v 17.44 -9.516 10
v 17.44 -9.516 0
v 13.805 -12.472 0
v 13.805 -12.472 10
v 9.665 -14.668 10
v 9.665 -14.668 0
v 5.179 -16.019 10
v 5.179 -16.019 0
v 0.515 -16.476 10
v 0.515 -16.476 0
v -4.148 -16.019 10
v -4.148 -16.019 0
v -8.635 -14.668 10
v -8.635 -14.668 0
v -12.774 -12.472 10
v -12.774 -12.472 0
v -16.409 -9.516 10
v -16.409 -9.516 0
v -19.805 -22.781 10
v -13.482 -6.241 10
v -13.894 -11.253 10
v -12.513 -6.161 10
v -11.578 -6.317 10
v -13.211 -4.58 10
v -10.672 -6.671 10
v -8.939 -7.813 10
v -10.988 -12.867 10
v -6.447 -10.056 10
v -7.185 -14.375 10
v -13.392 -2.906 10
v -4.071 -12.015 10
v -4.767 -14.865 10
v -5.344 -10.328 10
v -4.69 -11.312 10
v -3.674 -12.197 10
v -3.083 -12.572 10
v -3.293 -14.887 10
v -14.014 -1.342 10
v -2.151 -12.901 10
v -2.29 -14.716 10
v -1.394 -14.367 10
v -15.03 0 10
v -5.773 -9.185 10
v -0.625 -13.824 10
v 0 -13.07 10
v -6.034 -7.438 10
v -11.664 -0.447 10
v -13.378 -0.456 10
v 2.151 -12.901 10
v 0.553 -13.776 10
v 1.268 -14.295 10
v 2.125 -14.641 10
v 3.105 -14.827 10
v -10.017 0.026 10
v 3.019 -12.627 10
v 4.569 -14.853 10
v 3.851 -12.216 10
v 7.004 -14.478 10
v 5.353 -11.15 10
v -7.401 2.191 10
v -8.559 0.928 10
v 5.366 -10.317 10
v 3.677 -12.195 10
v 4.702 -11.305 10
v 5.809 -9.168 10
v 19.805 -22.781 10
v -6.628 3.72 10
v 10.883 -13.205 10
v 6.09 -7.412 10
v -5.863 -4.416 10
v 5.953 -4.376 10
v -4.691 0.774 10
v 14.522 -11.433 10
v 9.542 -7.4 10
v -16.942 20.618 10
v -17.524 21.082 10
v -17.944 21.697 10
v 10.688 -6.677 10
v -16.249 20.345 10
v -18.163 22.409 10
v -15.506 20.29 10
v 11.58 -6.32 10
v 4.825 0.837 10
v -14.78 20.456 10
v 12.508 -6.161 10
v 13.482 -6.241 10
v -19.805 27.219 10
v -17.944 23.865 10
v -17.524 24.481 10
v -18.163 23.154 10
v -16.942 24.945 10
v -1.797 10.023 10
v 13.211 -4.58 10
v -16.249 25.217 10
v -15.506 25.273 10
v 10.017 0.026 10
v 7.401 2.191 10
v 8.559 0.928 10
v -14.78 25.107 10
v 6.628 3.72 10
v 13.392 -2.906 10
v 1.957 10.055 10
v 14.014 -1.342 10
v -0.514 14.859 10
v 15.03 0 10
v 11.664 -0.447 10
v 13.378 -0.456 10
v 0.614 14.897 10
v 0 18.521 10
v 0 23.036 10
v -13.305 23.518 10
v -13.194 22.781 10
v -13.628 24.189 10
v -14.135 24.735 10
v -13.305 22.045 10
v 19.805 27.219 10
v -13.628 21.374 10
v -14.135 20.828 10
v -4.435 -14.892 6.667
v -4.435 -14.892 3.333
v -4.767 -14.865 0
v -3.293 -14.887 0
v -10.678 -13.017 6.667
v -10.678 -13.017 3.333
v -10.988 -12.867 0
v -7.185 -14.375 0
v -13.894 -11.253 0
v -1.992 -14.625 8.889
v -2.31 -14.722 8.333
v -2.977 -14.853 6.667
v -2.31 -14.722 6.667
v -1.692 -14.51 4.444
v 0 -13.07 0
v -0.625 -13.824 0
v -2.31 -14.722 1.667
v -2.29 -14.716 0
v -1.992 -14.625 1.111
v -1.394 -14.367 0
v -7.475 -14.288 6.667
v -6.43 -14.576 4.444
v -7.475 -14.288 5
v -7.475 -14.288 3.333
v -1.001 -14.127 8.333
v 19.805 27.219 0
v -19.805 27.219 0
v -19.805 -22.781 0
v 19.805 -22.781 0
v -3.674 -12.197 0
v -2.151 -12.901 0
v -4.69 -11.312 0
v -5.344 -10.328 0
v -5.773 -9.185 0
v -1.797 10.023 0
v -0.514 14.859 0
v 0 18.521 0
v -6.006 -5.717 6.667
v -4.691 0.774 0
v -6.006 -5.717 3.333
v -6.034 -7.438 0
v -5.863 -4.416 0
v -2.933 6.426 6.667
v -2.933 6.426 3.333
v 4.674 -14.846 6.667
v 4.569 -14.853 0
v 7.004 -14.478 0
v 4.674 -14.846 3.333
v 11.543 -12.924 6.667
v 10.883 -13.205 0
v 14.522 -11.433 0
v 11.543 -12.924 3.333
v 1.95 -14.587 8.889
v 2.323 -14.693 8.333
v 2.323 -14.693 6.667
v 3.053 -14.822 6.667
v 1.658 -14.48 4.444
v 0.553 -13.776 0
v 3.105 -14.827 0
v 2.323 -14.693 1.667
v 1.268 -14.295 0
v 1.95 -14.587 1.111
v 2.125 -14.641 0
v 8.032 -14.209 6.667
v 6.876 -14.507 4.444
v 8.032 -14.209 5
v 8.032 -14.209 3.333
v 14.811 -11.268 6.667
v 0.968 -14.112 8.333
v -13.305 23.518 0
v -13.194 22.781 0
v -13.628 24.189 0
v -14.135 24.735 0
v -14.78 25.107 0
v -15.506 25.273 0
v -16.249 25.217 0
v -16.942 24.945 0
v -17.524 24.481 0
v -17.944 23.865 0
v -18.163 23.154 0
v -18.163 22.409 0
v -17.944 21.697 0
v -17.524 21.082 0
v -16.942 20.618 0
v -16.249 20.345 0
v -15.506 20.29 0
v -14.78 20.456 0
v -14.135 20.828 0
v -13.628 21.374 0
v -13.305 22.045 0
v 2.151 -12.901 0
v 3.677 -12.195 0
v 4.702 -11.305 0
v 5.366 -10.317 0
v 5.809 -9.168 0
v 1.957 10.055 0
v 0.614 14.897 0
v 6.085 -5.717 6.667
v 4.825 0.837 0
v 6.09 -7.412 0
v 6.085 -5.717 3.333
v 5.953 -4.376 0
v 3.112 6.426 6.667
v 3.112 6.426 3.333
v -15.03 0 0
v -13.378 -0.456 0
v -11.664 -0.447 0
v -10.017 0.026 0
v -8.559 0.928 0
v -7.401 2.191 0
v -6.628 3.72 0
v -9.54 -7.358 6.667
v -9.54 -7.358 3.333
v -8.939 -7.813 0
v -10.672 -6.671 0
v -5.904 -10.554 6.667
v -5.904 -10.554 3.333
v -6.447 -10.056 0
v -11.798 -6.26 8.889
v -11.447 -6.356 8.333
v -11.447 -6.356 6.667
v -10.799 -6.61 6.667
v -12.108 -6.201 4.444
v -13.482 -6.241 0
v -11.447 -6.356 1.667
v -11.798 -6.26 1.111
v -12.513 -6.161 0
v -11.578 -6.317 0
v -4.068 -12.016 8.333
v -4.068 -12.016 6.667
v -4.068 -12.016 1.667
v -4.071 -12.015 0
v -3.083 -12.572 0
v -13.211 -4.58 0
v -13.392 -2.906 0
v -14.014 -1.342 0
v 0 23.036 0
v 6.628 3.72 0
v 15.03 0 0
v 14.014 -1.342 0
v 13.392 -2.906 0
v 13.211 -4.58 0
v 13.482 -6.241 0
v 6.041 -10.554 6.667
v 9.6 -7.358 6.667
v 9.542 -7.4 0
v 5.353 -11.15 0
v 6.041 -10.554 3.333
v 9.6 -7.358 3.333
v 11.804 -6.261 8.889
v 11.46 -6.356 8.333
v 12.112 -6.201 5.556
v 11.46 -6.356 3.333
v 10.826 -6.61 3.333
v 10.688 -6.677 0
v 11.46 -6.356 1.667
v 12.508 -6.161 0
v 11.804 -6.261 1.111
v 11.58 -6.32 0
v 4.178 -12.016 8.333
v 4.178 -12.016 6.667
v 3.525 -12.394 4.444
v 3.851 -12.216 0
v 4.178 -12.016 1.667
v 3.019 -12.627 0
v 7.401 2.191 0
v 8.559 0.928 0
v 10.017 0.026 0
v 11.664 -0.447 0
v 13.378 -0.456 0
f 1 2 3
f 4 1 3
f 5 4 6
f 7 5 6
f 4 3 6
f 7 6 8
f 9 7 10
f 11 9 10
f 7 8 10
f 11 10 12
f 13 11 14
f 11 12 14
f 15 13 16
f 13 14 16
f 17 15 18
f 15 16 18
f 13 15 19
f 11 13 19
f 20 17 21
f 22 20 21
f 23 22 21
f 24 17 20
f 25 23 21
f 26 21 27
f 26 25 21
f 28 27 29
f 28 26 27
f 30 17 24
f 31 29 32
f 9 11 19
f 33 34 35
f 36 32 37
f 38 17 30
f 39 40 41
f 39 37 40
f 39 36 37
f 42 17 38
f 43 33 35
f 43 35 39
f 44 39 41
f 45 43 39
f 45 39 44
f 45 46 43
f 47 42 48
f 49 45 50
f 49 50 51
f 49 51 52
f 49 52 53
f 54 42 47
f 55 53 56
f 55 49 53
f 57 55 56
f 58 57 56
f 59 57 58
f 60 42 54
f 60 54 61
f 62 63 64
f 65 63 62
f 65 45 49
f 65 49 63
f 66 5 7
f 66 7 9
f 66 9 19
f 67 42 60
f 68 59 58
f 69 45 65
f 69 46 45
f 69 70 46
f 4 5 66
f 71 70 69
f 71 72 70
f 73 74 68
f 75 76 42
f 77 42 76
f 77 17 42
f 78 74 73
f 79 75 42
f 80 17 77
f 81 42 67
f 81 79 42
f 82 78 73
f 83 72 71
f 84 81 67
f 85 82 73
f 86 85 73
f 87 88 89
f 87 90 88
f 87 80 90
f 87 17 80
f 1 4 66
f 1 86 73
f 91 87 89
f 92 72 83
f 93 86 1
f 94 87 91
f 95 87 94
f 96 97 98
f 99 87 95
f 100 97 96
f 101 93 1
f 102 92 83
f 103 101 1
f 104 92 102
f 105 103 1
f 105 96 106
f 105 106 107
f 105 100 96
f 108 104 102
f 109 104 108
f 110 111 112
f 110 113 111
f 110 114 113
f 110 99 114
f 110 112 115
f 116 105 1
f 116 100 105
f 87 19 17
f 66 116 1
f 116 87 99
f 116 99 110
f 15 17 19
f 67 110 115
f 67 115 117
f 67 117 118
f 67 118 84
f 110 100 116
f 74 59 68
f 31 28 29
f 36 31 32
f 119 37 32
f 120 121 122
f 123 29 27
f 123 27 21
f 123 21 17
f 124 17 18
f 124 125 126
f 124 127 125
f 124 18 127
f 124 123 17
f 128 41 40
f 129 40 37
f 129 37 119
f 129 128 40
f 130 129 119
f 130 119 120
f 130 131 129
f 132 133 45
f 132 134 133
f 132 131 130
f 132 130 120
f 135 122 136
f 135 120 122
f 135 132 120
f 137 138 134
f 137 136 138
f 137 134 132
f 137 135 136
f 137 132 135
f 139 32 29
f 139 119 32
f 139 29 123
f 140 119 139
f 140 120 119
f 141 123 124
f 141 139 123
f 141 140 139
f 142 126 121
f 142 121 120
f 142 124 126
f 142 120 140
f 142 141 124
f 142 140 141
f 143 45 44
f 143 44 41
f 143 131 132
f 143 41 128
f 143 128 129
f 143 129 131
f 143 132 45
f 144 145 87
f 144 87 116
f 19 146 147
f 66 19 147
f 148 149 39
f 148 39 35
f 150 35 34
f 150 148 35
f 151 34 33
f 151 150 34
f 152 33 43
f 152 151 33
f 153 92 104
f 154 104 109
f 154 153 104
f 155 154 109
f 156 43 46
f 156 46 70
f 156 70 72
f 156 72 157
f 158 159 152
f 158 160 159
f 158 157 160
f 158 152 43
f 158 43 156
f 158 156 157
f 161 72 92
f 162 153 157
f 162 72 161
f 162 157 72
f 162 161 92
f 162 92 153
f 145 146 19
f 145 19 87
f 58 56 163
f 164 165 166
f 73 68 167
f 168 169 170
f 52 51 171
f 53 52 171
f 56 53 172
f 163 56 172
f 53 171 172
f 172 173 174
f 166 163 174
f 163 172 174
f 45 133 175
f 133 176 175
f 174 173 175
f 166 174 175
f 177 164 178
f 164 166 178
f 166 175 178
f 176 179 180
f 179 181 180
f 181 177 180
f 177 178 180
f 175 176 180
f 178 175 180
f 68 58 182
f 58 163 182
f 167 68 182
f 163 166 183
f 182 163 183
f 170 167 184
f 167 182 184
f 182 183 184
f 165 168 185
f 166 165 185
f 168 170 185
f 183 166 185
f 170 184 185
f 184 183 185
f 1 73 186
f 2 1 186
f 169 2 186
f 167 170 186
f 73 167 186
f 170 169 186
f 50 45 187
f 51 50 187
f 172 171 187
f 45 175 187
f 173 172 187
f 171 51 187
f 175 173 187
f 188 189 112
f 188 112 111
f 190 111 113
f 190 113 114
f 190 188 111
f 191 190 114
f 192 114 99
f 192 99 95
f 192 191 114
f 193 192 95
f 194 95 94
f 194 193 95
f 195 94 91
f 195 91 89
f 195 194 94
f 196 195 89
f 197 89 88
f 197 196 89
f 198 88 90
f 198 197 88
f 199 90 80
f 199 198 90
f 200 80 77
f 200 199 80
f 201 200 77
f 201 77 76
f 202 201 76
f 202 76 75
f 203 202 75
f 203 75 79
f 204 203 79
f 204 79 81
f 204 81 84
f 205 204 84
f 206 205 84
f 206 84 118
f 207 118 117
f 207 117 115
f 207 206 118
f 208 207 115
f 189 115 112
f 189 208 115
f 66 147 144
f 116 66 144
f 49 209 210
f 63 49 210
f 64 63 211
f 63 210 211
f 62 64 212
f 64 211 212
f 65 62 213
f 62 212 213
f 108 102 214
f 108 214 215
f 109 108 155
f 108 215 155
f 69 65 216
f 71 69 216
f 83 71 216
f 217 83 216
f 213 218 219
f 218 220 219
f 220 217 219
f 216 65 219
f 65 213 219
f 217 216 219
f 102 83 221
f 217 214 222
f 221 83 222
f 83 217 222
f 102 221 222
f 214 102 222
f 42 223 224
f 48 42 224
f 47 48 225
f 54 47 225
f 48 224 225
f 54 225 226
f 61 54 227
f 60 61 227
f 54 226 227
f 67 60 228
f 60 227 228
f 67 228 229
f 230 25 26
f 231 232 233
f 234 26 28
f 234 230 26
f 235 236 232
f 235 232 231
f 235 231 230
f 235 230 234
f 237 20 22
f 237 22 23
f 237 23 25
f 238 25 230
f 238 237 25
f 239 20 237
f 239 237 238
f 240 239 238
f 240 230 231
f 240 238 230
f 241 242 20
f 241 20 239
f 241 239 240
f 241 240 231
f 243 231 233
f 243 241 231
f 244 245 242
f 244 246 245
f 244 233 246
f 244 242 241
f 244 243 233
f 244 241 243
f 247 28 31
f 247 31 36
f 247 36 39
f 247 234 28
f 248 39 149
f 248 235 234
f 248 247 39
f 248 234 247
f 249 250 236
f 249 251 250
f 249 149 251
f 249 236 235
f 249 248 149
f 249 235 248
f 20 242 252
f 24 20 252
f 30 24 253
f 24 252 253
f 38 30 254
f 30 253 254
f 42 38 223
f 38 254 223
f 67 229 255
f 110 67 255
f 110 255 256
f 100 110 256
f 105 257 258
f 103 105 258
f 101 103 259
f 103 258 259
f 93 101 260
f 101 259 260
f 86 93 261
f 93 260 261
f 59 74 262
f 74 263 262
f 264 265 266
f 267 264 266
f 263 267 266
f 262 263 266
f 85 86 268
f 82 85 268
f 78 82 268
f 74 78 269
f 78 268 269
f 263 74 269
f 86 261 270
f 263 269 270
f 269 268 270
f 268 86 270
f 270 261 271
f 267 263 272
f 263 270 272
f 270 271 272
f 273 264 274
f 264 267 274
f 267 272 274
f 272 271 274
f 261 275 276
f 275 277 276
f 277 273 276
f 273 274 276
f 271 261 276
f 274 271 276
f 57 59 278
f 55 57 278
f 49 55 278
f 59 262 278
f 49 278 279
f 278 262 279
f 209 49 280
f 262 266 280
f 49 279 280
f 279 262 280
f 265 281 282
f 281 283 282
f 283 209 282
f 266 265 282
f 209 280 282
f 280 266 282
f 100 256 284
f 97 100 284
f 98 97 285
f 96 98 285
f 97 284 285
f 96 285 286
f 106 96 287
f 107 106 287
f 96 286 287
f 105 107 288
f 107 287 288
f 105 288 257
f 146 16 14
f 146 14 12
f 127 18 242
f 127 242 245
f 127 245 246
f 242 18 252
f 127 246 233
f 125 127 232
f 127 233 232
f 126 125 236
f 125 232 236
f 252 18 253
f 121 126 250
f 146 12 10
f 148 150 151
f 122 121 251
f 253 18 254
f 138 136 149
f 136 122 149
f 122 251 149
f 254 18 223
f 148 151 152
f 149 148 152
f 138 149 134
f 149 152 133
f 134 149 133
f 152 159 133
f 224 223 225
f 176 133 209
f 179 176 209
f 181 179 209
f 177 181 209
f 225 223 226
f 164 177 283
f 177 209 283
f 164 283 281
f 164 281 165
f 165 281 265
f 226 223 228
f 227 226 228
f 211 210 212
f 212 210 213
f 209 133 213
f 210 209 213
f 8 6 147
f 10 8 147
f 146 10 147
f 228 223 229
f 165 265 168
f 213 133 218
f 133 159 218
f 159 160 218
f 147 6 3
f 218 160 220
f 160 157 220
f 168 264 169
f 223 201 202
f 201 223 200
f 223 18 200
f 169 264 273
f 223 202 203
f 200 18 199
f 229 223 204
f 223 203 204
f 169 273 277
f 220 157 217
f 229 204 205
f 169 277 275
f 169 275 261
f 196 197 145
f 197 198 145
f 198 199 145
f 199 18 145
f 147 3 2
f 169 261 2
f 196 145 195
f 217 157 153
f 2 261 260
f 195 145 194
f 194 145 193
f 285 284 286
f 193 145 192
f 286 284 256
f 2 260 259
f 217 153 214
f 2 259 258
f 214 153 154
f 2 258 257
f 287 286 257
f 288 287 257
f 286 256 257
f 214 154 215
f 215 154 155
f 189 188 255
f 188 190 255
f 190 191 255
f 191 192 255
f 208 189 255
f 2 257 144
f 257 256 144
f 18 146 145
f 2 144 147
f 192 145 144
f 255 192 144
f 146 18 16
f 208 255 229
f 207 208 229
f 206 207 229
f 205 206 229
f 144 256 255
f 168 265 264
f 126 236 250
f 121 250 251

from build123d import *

# Parameters (mm, degrees)
F0_W     = 39.610392
F0_H     = 50
F0_R     = 2.49857
F1_DEPTH = 10


with BuildPart() as f1:
    # F0 (on Top) → F1 (new body)
    with BuildSketch(Plane.XY):
        with Locations((0, 2.218615)):
            Rectangle(F0_W, F0_H)
        with BuildLine():
            ThreePointArc((17.439984, -9.515637), (0.515297, -16.475749), (-16.40939, -9.515637))
            add(Edge.make_bspline(
                [(0, -13.069506), (-2.759309, -17.431528), (-11.705375, -13.140691), (-16.40939, -9.515637)],
                knots=[0, 0, 0, 0, 16.789821, 16.789821, 16.789821, 16.789821], degree=3))
            add(Edge.make_bspline(
                [(0, -13.069506), (2.521035, -17.431528), (13.085214, -12.930726), (17.439984, -9.515637)],
                knots=[0, 0, 0, 0, 17.7984, 17.7984, 17.7984, 17.7984], degree=3))
        make_face(mode=Mode.SUBTRACT)
        with Locations((-15.692642, 22.781385)):
            Circle(F0_R, mode=Mode.SUBTRACT)
        with BuildLine():
            Line((-6.628194, 3.720442), (0, 23.035537))
            Line((0, 23.035537), (6.628194, 3.720442))
            ThreePointArc((6.628194, 3.720442), (10.016927, 0.025924), (15.030141, 0))
            ThreePointArc((15.030141, 0), (13.392417, -2.906154), (13.481836, -6.240802))
            add(Edge.make_bspline(
                [(13.481836, -6.240802), (9.220885, -5.342014), (6.425123, -11.953733), (2.150824, -12.901068)],
                knots=[0, 0, 0, 0, 13.143476, 13.143476, 13.143476, 13.143476], degree=3))
            add(Edge.make_bspline(
                [(2.150824, -12.901068), (11.792642, -9.865808), (0.927339, 8.11935), (0, 18.521211)],
                knots=[0, 0, 0, 0, 31.495803, 31.495803, 31.495803, 31.495803], degree=3))
            add(Edge.make_bspline(
                [(-2.150824, -12.901068), (-11.827089, -9.865808), (-0.506544, 8.11935), (0, 18.521211)],
                knots=[0, 0, 0, 0, 31.495803, 31.495803, 31.495803, 31.495803], degree=3))
            add(Edge.make_bspline(
                [(-13.481836, -6.240802), (-9.247256, -5.342014), (-6.102542, -11.953733), (-2.150824, -12.901068)],
                knots=[0, 0, 0, 0, 13.143476, 13.143476, 13.143476, 13.143476], degree=3))
            ThreePointArc((-13.481836, -6.240802), (-13.392417, -2.906154), (-15.030141, 0))
            ThreePointArc((-15.030141, 0), (-10.016927, 0.025924), (-6.628194, 3.720442))
        make_face(mode=Mode.SUBTRACT)
    extrude(amount=F1_DEPTH)


solid = f1.part
